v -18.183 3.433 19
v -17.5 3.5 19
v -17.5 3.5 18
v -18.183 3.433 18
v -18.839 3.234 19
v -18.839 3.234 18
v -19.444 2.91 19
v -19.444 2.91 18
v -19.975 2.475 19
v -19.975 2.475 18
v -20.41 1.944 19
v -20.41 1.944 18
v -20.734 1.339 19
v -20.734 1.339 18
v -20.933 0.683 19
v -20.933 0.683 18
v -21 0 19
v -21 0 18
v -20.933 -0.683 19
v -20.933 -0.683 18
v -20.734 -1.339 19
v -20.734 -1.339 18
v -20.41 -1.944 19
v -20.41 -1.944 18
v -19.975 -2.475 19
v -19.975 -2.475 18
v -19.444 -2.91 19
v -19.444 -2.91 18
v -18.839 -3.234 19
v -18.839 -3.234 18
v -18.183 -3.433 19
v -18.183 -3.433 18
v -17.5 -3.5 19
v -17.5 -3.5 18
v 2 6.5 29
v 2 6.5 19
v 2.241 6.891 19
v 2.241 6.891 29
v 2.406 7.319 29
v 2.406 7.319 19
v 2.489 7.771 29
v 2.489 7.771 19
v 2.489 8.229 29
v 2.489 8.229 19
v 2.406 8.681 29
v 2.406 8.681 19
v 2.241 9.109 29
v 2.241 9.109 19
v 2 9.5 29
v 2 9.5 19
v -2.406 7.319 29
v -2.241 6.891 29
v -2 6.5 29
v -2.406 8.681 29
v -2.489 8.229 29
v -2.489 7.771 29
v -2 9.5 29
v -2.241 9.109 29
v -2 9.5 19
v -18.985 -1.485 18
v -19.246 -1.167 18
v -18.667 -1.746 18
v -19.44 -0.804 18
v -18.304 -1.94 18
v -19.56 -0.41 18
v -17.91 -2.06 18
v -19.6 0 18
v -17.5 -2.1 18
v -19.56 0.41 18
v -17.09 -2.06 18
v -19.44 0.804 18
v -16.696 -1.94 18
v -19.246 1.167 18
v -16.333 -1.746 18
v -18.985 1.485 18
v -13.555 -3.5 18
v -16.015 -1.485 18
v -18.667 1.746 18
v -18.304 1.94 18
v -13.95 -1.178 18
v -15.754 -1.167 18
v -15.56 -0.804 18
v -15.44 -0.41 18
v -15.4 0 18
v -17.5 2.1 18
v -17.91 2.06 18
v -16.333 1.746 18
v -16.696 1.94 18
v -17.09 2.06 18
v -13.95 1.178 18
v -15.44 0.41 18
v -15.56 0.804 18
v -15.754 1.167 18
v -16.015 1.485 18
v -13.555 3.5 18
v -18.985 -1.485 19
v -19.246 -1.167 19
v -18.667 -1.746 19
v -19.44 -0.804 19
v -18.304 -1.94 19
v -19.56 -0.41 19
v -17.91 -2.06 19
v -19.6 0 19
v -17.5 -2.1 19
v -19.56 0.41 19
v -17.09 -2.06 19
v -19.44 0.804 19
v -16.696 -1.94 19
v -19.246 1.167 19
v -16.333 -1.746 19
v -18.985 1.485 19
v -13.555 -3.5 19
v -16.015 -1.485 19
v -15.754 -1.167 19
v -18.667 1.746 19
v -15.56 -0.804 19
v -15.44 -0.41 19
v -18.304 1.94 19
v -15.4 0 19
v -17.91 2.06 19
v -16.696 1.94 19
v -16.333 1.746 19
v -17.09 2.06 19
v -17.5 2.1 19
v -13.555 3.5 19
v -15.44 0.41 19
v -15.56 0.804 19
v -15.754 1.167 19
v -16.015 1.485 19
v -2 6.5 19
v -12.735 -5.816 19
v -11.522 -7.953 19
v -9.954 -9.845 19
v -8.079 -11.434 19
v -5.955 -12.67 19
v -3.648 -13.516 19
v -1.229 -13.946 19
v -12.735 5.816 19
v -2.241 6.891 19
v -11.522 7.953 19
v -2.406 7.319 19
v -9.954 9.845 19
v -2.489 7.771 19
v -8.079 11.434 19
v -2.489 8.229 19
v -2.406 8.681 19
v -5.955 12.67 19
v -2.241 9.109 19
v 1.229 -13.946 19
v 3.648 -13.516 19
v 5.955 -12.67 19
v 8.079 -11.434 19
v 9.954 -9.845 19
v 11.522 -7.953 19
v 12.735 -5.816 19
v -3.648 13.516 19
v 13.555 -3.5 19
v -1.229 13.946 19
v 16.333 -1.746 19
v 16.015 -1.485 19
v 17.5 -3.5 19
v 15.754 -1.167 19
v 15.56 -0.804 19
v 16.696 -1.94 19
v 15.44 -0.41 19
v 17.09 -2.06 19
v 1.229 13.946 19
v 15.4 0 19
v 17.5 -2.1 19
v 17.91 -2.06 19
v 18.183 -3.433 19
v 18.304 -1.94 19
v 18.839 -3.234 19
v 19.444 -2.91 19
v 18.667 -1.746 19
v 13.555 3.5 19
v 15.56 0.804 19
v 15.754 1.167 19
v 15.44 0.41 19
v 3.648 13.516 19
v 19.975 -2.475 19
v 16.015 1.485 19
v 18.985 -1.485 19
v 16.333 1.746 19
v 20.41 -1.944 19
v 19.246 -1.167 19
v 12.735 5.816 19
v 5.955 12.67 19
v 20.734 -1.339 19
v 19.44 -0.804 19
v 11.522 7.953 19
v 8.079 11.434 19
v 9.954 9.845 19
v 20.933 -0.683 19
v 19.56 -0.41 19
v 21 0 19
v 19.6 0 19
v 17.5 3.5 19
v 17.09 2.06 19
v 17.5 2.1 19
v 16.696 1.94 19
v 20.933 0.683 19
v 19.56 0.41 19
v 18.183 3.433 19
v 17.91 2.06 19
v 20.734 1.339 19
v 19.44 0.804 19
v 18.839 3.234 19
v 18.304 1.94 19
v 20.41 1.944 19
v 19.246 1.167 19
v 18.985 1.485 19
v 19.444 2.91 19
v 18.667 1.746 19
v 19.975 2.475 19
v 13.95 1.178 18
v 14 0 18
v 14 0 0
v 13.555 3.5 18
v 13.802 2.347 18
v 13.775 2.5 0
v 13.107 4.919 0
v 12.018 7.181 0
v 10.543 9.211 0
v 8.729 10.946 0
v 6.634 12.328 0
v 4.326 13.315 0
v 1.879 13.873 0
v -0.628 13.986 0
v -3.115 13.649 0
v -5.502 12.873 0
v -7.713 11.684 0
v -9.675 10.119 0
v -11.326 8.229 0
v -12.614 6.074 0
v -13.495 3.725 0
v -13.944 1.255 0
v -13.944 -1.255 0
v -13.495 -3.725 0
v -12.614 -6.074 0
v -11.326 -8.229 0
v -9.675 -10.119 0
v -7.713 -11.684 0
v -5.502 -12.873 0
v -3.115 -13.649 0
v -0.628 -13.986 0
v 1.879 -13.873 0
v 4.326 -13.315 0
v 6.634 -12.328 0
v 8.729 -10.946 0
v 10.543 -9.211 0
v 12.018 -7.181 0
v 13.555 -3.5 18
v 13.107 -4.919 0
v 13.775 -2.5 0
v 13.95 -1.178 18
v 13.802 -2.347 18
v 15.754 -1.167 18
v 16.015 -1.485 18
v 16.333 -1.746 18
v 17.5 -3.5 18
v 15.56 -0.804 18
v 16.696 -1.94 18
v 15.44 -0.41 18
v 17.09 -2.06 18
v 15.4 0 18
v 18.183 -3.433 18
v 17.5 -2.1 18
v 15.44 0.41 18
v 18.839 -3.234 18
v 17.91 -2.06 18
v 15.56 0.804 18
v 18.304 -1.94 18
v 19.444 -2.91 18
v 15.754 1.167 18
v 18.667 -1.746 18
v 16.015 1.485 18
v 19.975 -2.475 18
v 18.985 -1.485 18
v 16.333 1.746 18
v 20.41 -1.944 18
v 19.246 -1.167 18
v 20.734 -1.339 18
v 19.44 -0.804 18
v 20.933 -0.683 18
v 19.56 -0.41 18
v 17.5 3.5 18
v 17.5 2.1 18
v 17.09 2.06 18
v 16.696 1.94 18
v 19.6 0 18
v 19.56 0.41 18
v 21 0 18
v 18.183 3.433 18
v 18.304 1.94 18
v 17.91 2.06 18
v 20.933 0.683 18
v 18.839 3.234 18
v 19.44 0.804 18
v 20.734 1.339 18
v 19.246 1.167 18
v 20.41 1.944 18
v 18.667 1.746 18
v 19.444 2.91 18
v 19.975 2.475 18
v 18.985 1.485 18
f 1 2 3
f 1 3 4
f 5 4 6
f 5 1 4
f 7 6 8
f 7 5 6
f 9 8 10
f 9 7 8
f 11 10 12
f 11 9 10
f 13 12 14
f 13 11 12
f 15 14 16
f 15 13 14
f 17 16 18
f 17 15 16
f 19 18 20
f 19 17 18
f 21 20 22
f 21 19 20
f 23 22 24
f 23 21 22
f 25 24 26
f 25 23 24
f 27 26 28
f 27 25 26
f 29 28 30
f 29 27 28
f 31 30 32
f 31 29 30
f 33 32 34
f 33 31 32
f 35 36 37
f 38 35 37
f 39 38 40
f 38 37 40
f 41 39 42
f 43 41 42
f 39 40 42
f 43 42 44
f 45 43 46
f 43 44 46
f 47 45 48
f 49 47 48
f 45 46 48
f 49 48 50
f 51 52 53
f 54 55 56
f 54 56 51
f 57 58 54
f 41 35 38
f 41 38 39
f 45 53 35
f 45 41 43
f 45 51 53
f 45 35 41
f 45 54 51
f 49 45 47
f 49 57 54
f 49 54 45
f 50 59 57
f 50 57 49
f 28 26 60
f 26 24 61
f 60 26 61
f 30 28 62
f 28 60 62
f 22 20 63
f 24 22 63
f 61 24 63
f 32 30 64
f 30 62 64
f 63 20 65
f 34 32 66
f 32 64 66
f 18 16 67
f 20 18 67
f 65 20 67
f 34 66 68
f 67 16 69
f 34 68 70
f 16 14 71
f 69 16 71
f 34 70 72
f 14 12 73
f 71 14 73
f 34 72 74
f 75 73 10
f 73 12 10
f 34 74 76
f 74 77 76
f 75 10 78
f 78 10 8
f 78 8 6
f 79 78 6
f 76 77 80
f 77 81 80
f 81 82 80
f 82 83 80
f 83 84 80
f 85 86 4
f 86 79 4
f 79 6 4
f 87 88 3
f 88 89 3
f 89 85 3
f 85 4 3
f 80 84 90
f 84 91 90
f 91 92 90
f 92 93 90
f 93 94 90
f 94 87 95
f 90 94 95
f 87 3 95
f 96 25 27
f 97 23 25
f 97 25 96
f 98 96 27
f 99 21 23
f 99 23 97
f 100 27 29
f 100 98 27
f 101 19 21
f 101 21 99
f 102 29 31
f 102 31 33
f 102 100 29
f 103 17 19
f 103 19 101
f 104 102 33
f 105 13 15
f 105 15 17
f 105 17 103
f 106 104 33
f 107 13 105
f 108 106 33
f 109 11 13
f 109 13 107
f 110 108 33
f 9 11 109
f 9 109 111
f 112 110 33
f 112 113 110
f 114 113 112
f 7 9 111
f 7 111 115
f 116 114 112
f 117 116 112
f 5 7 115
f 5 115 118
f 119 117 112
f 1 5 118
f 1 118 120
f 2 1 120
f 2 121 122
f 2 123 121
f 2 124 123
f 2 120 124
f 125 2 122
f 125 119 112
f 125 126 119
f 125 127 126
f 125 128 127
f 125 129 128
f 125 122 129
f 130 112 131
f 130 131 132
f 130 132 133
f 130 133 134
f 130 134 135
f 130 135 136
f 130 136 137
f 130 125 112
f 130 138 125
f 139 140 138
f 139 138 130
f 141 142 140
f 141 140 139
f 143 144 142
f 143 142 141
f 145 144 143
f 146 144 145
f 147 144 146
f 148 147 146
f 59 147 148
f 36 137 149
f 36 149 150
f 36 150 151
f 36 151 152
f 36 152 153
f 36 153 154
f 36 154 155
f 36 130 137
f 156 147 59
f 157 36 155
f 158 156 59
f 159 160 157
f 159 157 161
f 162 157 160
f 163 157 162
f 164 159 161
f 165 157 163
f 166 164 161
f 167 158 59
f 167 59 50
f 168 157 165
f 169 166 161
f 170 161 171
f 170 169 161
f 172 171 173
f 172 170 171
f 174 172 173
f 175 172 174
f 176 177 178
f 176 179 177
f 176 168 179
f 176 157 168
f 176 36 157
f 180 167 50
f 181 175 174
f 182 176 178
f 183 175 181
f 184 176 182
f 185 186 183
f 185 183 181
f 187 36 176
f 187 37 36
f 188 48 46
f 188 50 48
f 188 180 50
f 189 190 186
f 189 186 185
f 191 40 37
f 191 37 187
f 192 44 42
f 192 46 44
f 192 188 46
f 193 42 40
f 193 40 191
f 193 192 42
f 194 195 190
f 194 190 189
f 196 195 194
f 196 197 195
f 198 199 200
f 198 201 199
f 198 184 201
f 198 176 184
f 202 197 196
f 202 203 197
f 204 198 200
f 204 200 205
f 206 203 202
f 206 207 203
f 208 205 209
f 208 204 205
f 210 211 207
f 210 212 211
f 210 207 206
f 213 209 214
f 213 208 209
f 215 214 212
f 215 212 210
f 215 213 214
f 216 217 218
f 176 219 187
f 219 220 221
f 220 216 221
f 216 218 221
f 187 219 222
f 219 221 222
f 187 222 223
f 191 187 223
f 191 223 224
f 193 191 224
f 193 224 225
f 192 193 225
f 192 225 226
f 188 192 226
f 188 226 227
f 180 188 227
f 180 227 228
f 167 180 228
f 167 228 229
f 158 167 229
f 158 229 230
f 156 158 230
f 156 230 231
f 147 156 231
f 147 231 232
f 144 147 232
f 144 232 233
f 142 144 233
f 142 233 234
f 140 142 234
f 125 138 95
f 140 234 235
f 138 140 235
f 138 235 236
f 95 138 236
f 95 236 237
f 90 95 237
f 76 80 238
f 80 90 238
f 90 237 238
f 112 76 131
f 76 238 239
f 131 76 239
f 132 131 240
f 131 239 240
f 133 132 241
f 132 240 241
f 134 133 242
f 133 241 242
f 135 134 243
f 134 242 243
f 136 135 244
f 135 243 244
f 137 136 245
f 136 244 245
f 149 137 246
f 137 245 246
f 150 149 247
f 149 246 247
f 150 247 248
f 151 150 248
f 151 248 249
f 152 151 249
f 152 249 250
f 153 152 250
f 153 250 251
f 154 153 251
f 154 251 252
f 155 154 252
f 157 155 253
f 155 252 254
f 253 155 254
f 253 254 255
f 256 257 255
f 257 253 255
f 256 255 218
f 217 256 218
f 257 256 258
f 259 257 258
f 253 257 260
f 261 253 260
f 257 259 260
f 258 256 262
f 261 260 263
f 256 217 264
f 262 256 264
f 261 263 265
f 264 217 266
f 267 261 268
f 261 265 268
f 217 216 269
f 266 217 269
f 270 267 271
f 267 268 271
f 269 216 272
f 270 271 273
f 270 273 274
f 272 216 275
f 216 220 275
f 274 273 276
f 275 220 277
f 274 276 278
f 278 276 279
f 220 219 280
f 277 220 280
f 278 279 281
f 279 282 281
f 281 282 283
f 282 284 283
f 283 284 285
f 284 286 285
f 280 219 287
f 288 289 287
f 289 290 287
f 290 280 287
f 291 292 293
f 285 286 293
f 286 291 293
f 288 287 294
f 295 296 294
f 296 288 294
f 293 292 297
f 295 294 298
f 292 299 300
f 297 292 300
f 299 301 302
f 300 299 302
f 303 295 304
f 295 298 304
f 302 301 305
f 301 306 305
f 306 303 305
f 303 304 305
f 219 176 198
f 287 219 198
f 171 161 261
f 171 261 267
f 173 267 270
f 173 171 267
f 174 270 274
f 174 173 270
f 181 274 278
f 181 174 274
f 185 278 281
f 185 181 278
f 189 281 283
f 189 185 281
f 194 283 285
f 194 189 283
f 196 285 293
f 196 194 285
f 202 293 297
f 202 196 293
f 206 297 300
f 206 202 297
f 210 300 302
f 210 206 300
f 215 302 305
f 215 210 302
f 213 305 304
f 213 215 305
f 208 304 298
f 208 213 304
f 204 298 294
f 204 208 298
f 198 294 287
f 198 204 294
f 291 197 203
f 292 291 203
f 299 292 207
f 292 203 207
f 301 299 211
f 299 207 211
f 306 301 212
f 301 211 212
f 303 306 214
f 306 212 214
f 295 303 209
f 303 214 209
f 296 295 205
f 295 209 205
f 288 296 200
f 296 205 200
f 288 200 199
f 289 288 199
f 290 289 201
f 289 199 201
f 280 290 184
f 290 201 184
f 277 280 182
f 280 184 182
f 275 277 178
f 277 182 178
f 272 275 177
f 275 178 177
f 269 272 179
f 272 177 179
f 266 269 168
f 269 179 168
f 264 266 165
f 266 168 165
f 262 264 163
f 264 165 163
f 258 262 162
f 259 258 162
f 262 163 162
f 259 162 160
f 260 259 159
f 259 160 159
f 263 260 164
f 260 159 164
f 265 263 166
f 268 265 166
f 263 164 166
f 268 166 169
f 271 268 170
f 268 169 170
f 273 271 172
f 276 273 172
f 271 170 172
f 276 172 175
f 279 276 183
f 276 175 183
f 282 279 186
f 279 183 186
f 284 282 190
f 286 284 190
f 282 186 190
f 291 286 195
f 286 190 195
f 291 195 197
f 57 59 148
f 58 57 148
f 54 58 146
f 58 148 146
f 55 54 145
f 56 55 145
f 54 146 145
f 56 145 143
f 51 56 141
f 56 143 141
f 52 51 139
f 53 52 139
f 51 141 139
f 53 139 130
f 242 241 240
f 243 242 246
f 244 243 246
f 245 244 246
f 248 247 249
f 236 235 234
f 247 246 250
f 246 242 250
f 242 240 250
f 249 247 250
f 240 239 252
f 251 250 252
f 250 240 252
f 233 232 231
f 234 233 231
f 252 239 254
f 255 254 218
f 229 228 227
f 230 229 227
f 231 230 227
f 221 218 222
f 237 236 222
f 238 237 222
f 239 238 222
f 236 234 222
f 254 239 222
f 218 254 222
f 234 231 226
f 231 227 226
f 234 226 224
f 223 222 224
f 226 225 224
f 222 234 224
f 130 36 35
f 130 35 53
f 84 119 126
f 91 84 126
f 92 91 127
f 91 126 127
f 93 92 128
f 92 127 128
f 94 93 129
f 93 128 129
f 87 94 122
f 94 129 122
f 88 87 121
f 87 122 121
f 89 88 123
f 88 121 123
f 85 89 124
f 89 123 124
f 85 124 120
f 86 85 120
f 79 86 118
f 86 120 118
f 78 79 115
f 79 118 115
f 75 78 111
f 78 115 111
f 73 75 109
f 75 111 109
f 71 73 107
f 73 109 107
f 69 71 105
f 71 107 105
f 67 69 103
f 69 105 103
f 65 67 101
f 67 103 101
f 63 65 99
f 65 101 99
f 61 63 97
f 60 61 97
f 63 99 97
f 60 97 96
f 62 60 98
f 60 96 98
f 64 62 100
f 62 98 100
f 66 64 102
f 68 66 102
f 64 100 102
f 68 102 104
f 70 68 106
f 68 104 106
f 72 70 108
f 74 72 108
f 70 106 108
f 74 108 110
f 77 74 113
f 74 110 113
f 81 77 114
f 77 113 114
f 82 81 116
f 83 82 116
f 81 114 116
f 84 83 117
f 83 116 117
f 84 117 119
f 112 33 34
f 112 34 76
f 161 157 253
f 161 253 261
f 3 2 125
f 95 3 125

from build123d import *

# Parameters (mm, degrees)
SKETCH_R     = 14
PAD_DEPTH    = 19
PAD001_DEPTH = 10
SKETCH002_R  = 2.1
PAD002_DEPTH = 1


with BuildPart() as part:
    # Sketch → Pad (new body)
    with BuildSketch(Plane.XY):
        Circle(SKETCH_R)
    extrude(amount=PAD_DEPTH)

    # Sketch001 → Pad001 (new body)
    with BuildSketch(Plane.XY.offset(19)):
        with BuildLine():
            ThreePointArc((-2, 9.5), (-2.5, 8), (-2, 6.5))
            Line((2, 6.5), (-2, 6.5))
            ThreePointArc((2, 6.5), (2.5, 8), (2, 9.5))
            Line((-2, 9.5), (2, 9.5))
        make_face()
    extrude(amount=PAD001_DEPTH)

    # Sketch002 → Pad002 (new body)
    with BuildSketch(Plane.XY.offset(19)):
        with BuildLine():
            ThreePointArc((-17.5, 3.5), (-21, 0), (-17.5, -3.5))
            Line((-17.5, -3.5), (17.5, -3.5))
            ThreePointArc((17.5, -3.5), (21, 0), (17.5, 3.5))
            Line((-17.5, 3.5), (17.5, 3.5))
        make_face()
        with Locations((-17.5, 0)):
            Circle(SKETCH002_R, mode=Mode.SUBTRACT)
        with Locations((17.5, 0)):
            Circle(SKETCH002_R, mode=Mode.SUBTRACT)
    extrude(amount=-PAD002_DEPTH)


solid = part.part
